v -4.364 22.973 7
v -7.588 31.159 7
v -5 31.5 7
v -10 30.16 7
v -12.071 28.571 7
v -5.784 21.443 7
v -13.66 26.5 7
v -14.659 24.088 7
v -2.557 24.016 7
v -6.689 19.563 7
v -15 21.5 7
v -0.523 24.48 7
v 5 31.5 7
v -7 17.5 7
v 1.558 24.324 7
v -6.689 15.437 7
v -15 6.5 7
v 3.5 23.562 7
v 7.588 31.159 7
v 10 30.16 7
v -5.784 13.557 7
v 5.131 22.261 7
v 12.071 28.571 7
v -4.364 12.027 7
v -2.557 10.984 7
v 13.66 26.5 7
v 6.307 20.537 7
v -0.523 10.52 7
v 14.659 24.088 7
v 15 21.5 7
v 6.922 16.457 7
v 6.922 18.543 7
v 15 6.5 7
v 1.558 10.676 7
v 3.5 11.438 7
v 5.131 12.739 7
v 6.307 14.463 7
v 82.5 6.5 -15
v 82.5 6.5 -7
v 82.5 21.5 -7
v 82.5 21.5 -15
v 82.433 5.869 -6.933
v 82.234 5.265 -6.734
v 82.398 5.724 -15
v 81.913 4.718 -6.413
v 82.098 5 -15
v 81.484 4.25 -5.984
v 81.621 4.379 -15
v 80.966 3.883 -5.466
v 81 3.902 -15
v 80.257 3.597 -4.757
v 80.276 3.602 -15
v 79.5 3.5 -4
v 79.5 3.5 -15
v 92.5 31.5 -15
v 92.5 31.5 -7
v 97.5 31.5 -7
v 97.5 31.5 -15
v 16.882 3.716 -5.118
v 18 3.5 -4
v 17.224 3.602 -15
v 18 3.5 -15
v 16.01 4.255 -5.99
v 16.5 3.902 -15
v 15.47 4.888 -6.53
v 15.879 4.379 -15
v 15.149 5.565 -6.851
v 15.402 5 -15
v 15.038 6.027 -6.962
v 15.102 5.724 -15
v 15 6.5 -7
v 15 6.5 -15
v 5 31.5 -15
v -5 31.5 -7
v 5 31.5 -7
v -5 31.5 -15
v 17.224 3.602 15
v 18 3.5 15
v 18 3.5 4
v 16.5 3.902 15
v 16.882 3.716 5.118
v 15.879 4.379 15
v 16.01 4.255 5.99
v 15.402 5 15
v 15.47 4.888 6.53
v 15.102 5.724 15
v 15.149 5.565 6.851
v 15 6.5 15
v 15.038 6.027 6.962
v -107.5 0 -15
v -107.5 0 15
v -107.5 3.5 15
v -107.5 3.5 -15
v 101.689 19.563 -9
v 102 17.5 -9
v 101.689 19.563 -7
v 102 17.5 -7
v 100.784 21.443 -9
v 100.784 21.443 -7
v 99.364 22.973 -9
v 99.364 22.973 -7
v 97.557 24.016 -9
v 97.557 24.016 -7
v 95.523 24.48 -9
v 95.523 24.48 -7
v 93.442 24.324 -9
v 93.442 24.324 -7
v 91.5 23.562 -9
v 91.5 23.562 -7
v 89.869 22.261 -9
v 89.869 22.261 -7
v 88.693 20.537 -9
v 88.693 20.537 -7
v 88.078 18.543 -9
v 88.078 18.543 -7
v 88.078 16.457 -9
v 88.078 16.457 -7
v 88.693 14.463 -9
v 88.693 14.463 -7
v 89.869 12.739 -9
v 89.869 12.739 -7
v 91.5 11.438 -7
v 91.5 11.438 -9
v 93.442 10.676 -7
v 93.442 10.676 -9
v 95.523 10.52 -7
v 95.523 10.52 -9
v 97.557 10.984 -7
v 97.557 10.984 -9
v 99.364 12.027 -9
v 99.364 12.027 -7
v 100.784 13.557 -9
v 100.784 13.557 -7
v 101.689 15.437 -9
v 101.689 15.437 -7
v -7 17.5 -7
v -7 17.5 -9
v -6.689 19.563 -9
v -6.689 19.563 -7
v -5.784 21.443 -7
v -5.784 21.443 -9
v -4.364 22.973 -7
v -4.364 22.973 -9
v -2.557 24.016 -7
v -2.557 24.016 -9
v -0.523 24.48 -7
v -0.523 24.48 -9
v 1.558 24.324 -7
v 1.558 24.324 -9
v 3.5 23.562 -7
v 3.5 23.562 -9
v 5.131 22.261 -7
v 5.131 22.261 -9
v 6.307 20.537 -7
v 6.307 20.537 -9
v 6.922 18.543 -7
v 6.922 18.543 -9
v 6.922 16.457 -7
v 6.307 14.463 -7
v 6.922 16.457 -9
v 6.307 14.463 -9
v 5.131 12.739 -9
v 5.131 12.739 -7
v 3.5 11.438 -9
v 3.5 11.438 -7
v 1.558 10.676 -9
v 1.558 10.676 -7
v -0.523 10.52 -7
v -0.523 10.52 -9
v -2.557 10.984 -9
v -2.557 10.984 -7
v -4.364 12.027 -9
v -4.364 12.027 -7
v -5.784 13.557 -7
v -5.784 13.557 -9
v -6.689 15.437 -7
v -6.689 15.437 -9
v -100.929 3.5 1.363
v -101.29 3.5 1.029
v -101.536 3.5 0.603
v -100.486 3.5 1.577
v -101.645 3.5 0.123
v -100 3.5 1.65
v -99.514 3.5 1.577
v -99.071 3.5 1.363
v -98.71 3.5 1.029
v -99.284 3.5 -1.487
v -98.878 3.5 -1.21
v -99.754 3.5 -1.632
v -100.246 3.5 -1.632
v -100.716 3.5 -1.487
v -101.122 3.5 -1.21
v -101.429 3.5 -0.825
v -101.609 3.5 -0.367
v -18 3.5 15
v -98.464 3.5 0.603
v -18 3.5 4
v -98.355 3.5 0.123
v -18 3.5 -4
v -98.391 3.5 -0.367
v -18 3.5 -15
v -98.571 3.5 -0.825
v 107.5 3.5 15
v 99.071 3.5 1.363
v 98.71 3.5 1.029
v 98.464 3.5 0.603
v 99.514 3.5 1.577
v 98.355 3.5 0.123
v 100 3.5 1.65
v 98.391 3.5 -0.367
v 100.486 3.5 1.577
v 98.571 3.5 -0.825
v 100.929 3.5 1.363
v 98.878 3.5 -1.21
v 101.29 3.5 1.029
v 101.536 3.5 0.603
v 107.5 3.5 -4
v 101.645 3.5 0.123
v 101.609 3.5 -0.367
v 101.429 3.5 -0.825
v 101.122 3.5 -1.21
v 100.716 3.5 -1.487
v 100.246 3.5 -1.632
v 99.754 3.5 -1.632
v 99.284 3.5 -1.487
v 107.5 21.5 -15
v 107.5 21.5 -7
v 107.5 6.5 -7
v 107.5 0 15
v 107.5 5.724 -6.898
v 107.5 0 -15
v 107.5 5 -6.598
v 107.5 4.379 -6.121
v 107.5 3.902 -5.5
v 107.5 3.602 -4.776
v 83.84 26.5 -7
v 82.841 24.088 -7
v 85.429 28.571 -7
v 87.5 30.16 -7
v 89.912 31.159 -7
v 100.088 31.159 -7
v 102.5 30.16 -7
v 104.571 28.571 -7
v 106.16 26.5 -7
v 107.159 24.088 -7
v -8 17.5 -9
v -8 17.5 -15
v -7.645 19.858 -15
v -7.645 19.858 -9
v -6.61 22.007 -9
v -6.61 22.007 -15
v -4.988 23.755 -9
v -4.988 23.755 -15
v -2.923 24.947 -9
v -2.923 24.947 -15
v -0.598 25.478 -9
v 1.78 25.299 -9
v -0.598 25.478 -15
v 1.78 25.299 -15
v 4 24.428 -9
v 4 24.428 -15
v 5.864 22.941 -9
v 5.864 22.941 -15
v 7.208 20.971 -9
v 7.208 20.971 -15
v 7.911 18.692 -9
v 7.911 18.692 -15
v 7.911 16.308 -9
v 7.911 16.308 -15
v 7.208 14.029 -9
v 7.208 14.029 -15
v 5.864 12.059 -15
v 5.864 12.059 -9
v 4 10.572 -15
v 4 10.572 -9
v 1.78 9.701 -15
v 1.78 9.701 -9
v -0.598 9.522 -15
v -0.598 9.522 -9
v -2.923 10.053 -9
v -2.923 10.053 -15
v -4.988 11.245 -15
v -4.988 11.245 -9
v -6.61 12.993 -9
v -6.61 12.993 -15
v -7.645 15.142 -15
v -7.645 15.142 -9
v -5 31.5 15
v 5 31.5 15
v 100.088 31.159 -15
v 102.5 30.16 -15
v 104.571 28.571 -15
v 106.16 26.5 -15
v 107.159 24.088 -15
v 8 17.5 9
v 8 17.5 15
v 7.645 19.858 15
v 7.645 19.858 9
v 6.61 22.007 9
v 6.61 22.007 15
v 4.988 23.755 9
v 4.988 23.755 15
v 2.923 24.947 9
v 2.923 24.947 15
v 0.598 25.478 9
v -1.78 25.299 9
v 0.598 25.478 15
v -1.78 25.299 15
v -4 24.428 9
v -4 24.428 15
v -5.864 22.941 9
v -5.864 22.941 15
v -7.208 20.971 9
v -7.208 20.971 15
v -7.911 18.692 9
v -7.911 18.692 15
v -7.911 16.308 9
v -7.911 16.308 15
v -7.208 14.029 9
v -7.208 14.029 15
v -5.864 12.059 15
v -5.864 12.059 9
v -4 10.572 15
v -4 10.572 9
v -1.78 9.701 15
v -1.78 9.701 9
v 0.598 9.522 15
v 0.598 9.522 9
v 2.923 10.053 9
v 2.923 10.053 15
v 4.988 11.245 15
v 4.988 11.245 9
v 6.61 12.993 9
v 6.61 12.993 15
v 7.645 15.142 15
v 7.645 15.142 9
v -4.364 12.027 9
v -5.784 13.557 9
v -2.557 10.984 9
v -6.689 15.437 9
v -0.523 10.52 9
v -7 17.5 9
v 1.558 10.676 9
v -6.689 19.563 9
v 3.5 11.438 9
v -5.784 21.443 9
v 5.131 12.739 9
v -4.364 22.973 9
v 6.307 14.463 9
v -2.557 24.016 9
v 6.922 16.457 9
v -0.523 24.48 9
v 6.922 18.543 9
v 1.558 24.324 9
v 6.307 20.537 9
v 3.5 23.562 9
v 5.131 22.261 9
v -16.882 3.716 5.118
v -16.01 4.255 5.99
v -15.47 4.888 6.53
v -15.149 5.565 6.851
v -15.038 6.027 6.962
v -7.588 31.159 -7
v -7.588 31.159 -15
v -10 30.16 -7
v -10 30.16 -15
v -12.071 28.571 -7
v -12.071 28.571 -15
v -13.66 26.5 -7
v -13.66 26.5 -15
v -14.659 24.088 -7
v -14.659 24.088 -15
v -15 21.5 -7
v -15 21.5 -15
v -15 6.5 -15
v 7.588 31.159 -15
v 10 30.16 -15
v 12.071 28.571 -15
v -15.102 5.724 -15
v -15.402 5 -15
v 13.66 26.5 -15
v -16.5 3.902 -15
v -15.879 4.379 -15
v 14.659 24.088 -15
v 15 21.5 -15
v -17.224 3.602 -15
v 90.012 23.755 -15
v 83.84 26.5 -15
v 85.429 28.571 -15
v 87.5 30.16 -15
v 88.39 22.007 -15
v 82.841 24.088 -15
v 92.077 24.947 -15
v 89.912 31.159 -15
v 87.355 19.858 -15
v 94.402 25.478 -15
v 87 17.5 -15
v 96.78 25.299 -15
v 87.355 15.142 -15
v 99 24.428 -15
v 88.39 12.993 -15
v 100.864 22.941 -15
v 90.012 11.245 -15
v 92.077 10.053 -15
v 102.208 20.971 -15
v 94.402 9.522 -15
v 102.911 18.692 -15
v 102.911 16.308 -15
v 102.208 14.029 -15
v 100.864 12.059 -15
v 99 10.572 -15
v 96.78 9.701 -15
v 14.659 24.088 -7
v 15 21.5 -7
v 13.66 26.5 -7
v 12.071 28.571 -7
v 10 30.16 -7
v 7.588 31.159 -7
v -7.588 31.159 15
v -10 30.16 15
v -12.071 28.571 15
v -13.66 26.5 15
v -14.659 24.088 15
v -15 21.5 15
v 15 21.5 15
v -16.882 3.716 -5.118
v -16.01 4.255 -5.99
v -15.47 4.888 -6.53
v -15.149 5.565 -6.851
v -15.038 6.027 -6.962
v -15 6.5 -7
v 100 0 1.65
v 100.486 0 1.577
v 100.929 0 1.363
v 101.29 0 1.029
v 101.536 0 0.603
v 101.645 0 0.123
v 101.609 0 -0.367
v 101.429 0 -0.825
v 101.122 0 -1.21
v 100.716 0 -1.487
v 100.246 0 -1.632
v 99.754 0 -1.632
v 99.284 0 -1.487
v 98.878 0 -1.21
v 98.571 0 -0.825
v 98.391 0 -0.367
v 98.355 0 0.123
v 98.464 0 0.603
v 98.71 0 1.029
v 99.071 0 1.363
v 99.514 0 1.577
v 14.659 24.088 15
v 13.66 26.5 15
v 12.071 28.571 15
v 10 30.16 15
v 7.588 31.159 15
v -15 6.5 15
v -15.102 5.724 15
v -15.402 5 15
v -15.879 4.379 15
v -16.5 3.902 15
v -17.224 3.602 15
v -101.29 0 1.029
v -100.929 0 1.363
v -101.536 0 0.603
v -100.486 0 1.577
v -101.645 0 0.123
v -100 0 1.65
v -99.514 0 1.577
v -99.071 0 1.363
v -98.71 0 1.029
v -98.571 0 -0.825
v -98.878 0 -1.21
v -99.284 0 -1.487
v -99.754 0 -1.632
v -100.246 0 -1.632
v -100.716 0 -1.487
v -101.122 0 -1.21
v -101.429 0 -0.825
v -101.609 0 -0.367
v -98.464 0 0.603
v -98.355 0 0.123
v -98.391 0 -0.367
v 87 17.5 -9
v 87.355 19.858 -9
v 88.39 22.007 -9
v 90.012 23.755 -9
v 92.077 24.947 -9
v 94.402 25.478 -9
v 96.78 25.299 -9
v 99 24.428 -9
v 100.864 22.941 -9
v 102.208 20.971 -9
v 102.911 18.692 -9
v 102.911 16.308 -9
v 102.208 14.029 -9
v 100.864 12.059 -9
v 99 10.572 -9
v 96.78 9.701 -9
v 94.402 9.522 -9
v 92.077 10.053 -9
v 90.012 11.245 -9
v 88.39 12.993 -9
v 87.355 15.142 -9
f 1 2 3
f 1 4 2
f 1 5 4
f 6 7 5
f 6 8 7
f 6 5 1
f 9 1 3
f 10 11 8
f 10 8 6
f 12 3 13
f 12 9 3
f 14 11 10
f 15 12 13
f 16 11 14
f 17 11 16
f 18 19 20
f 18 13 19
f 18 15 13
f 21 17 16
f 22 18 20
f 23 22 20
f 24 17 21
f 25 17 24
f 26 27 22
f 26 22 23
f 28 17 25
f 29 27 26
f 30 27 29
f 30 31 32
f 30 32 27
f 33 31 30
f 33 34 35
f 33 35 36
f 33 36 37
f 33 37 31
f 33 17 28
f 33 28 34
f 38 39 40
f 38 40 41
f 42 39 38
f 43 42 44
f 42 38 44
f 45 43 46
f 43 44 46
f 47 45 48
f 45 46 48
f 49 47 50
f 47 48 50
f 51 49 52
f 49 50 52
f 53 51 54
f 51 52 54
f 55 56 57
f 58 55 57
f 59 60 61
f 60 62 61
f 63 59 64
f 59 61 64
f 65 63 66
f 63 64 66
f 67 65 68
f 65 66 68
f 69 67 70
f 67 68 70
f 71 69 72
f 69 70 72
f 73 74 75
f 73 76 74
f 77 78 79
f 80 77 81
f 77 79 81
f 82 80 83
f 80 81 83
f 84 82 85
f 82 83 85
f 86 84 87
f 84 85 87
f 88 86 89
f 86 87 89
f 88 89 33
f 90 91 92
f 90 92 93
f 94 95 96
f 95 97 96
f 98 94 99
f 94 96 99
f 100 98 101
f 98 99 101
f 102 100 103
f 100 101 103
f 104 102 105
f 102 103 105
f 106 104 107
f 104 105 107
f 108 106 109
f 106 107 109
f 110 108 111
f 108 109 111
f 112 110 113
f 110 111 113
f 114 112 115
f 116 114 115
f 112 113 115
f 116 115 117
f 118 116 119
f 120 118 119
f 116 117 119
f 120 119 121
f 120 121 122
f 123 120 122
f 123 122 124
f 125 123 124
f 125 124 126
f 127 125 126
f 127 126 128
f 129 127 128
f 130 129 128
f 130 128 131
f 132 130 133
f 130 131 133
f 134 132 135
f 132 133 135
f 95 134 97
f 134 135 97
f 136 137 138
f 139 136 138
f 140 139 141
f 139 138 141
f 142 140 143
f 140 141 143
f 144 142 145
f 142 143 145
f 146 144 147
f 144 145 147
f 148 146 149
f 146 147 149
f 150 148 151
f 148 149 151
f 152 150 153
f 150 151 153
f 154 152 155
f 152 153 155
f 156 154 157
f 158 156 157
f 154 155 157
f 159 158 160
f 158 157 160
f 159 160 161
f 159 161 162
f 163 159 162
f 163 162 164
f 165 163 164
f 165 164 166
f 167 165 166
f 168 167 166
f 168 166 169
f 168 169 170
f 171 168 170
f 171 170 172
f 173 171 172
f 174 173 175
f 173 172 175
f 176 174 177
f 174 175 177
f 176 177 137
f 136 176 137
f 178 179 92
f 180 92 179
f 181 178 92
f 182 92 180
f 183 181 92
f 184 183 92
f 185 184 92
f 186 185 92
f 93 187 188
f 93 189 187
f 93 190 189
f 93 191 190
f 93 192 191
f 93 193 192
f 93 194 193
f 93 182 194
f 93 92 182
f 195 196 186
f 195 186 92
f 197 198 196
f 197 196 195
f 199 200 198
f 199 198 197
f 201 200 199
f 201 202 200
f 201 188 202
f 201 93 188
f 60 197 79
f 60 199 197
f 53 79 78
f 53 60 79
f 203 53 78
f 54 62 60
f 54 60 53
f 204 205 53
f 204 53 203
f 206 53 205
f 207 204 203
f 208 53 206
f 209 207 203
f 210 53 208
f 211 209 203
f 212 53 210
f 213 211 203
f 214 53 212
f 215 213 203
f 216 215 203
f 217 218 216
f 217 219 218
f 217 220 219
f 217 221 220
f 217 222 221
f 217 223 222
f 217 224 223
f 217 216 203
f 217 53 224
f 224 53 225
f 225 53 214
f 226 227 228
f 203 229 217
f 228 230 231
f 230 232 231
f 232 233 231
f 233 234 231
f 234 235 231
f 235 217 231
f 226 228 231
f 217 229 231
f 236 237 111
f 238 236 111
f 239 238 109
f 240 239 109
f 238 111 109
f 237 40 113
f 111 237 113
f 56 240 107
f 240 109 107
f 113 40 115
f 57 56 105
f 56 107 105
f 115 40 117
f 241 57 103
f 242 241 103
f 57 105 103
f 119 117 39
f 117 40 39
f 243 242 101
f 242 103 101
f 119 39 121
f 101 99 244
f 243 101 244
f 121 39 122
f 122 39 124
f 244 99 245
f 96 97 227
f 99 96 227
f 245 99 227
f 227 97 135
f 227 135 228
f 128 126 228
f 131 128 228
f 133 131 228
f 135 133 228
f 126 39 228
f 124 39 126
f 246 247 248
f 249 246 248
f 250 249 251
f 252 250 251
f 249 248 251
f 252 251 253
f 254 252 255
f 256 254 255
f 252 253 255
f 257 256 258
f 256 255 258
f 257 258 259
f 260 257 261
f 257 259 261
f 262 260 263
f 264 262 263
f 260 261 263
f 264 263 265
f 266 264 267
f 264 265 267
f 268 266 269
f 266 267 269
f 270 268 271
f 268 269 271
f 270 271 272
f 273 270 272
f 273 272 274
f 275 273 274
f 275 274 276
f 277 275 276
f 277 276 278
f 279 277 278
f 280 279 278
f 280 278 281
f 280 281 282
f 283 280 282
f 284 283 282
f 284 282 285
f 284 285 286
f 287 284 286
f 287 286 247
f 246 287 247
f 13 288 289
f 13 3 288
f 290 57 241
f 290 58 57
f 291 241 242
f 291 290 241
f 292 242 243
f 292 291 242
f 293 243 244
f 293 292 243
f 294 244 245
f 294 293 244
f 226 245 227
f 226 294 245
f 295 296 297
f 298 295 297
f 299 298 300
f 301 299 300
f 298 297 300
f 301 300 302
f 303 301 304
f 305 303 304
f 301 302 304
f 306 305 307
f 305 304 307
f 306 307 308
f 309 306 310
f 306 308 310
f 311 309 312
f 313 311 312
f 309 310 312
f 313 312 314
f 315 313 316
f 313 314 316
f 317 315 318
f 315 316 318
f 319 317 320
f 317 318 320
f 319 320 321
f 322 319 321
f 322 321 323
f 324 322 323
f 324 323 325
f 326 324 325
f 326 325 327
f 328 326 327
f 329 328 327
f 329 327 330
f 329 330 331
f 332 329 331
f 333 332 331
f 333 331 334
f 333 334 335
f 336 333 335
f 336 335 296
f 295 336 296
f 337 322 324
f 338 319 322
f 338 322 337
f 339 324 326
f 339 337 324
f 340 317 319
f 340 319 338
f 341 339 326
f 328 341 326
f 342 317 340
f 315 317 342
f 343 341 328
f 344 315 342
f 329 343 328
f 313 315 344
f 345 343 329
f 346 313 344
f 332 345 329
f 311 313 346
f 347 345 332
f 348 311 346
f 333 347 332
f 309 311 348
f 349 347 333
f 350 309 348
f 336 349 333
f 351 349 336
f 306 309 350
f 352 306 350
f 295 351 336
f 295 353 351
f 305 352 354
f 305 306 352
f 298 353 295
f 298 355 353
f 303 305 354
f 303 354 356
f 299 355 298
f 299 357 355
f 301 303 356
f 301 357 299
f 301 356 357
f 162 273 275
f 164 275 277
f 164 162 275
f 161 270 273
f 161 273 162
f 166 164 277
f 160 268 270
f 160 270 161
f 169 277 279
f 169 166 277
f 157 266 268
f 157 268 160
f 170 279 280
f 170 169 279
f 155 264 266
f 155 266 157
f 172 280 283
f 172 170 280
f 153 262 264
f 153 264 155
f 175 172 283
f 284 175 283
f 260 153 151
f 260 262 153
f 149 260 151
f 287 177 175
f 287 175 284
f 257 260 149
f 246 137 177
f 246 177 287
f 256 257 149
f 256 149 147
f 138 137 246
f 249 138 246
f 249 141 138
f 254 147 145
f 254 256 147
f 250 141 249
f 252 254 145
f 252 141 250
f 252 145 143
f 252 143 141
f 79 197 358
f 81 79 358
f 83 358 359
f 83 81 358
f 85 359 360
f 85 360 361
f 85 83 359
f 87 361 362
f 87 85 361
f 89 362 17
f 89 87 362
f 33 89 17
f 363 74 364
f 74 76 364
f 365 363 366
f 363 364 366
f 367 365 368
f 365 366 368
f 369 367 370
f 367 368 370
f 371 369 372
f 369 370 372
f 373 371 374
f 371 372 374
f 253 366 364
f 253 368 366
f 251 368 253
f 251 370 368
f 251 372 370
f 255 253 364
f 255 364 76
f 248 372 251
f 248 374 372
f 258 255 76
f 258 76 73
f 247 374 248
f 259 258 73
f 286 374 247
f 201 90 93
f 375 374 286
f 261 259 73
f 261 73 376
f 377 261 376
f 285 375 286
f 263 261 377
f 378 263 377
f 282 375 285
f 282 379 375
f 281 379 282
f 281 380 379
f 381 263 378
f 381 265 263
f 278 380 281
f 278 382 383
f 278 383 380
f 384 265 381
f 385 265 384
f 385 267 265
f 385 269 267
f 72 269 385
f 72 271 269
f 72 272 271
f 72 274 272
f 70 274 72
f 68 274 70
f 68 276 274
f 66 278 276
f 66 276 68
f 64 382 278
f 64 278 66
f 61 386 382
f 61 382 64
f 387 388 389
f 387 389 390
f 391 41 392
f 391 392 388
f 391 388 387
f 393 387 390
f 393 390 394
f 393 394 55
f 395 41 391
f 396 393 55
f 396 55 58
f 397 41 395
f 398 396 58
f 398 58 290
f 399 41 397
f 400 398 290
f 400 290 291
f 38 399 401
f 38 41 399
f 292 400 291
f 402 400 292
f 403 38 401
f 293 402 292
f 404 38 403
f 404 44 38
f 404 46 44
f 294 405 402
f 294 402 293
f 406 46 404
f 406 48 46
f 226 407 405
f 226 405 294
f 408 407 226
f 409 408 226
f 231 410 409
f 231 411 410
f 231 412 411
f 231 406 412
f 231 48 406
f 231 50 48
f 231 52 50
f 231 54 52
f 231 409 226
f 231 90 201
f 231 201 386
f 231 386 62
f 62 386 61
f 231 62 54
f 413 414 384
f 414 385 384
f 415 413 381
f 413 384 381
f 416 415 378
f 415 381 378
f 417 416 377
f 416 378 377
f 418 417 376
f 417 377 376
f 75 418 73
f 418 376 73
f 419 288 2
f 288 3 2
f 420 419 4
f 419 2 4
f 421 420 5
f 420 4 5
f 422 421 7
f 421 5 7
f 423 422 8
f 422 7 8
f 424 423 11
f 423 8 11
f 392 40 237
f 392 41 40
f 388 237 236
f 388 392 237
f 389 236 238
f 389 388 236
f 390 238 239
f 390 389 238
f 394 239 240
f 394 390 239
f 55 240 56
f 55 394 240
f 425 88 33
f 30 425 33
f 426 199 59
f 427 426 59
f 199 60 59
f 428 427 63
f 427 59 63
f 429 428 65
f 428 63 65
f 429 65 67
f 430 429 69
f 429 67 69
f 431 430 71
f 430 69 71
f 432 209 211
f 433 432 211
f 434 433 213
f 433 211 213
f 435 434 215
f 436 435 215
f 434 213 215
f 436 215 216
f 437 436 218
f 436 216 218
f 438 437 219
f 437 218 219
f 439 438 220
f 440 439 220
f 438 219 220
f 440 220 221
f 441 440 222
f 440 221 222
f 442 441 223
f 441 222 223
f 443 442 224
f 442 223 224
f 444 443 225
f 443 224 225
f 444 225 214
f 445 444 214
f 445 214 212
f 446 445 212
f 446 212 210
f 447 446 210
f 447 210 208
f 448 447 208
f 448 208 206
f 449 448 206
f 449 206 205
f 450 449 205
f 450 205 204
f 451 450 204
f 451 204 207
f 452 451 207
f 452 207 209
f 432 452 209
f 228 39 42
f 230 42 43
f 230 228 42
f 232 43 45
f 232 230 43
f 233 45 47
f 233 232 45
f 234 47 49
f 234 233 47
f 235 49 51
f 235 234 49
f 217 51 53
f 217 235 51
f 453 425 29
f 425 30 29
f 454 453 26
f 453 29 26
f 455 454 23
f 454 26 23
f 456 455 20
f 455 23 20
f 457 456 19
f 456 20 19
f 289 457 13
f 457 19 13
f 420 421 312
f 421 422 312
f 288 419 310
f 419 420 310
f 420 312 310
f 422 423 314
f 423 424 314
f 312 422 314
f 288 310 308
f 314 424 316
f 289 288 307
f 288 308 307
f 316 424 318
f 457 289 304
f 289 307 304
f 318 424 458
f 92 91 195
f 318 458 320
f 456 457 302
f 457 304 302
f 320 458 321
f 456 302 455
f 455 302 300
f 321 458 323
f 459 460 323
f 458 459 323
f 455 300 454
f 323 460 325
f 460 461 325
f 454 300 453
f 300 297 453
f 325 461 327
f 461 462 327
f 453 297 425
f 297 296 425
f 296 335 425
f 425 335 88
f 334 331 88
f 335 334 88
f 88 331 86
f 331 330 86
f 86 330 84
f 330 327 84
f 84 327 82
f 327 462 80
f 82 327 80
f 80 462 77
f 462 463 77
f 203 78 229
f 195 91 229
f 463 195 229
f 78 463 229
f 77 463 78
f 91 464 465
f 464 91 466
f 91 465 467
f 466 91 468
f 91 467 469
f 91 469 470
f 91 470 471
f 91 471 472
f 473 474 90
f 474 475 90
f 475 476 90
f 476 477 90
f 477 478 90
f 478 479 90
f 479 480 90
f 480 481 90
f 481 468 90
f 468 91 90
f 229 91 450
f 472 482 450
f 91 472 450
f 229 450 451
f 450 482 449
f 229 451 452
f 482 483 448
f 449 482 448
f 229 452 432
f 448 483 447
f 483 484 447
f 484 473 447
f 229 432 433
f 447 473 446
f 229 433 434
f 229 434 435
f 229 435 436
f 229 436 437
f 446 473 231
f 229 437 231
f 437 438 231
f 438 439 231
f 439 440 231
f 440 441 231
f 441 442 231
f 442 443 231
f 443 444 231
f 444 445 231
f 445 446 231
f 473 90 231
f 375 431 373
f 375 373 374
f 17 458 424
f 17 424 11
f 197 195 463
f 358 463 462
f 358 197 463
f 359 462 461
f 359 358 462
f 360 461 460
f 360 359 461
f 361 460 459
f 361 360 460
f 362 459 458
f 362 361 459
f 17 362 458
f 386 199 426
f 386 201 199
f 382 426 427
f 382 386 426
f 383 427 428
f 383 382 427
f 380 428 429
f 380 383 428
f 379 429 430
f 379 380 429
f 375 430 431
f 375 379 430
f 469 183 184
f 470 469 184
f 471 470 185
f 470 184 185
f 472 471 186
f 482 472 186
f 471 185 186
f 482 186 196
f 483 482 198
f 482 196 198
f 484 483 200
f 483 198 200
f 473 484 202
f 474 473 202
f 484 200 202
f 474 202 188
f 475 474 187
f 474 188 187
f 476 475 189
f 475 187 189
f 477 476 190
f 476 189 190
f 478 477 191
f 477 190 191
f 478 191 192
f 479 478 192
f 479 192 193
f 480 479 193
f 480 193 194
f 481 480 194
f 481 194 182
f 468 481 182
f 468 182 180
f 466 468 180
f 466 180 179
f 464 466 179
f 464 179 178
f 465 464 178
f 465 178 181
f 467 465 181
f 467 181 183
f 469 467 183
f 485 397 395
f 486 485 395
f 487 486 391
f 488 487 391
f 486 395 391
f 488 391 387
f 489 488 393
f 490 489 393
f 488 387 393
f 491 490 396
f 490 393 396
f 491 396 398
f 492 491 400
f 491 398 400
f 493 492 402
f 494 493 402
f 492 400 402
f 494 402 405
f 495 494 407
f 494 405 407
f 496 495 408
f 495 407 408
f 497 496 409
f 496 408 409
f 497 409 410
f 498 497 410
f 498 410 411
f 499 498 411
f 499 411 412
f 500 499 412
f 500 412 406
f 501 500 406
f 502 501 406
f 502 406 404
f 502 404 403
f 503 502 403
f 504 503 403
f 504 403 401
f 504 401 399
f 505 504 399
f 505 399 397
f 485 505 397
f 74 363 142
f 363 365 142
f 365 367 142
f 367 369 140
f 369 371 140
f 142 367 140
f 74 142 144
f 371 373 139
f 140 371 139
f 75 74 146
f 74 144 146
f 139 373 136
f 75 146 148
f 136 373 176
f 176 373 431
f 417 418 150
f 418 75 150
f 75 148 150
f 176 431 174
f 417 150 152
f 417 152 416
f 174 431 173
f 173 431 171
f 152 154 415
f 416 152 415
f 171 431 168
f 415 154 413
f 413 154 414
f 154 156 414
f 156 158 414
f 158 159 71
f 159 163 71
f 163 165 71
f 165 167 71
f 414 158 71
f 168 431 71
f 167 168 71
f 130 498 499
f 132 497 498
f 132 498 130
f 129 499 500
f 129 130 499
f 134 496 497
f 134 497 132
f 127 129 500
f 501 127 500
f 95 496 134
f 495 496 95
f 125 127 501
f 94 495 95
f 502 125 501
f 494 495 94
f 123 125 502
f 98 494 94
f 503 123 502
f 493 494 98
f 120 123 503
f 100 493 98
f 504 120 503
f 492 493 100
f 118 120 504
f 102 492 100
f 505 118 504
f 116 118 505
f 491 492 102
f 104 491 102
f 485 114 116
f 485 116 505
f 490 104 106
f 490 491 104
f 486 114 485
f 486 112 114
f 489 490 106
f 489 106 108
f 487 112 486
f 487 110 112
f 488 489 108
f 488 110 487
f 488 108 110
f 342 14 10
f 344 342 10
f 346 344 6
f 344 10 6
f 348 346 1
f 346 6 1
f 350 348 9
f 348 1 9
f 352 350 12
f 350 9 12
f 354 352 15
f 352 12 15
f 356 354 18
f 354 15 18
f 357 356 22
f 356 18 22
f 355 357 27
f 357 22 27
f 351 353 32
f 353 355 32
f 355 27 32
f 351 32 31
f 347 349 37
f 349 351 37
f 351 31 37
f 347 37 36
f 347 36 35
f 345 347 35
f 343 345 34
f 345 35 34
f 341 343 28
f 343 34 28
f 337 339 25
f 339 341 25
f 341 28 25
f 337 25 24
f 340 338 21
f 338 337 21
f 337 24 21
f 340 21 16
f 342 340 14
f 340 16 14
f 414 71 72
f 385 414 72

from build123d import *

# Parameters (mm, degrees)
SKETCH2_W                                         = 215
SKETCH2_H                                         = 30
BOSS_EXTRUDE1_DEPTH                               = 3.5
SKETCH4_W                                         = 30
SKETCH4_H                                         = 8
SKETCH4_W_2                                       = 25
BOSS_EXTRUDE2_DEPTH                               = 28
CBORE_FOR_M6_HEX_HEAD_BOLT1_D                     = 14
CBORE_FOR_M6_HEX_HEAD_BOLT1_CBORE_D               = 16
CBORE_FOR_M6_HEX_HEAD_BOLT1_CBORE_DEPTH           = 6
CBORE_FOR_M6_HEX_HEAD_BOLT1_ON_FACE_2_D           = 14
CBORE_FOR_M6_HEX_HEAD_BOLT1_ON_FACE_2_CBORE_D     = 16
CBORE_FOR_M6_HEX_HEAD_BOLT1_ON_FACE_2_CBORE_DEPTH = 6
FILLET1_R                                         = 10
HOLES_TBD_R                                       = 1.65
CUT_EXTRUDE1_DEPTH                                = 113.094825929
FILLET2_R                                         = 3


with BuildPart() as part:
    # Sketch2 → Boss-Extrude1 (new body)
    with BuildSketch(Plane(origin=(0, 0, 0), x_dir=(1, 0, 0), z_dir=(0, 1, 0))):
        Rectangle(SKETCH2_W, SKETCH2_H)
    extrude(amount=BOSS_EXTRUDE1_DEPTH)

    # Sketch4 → Boss-Extrude2 (add)
    with BuildSketch(Plane(origin=(0, 3.5, 0), x_dir=(1, 0, 0), z_dir=(0, 1, 0))):
        with Locations((0, -11)):
            Rectangle(SKETCH4_W, SKETCH4_H)
        with Locations((95, 11)):
            Rectangle(SKETCH4_W_2, SKETCH4_H)
        with Locations((0, 11)):
            Rectangle(SKETCH4_W, SKETCH4_H)
    extrude(amount=BOSS_EXTRUDE2_DEPTH)

    # CBORE for M6 Hex Head Bolt1 (through all)
    with Locations(Plane(origin=(0, 17.5, 15), x_dir=(1, 0, 0), z_dir=(0, 0, 1))):
        with Locations((0, 0)):
            CounterBoreHole(CBORE_FOR_M6_HEX_HEAD_BOLT1_D / 2, CBORE_FOR_M6_HEX_HEAD_BOLT1_CBORE_D / 2, CBORE_FOR_M6_HEX_HEAD_BOLT1_CBORE_DEPTH)

    # CBORE for M6 Hex Head Bolt1 on face 2 (through all)
    with Locations(Plane(origin=(0, 17.5, -15), x_dir=(-1, 0, 0), z_dir=(0, 0, -1))):
        with Locations((0, 0), (-95, 0)):
            CounterBoreHole(CBORE_FOR_M6_HEX_HEAD_BOLT1_ON_FACE_2_D / 2, CBORE_FOR_M6_HEX_HEAD_BOLT1_ON_FACE_2_CBORE_D / 2, CBORE_FOR_M6_HEX_HEAD_BOLT1_ON_FACE_2_CBORE_DEPTH)

    # Fillet1
    fillet1_edges = [part.edges().sort_by_distance(p)[0] for p in [
        (107.5, 31.5, -11),
        (82.5, 31.5, -11),
        (-15, 31.5, 11),
        (15, 31.5, 11),
        (-15, 31.5, -11),
        (15, 31.5, -11),
    ]]
    fillet(fillet1_edges, radius=FILLET1_R)

    # HOLES TBD → Cut-Extrude1 (cut, through all)
    with BuildSketch(Plane(origin=(0, 3.5, 0), x_dir=(1, 0, 0), z_dir=(0, 1, 0))):
        with Locations(Location((-100, 0, 0), (0, 0, 270))):
            Circle(HOLES_TBD_R)
        with Locations(Location((100, 0, 0), (0, 0, 270))):
            Circle(HOLES_TBD_R)
    extrude(amount=-CUT_EXTRUDE1_DEPTH, mode=Mode.SUBTRACT)

    # Fillet2
    fillet2_edges = [part.edges().sort_by_distance(p)[0] for p in [
        (82.5, 3.5, -11),
        (95, 3.5, -7),
        (-15, 3.5, 11),
        (15, 3.5, 11),
        (0, 3.5, 7),
        (-15, 3.5, -11),
        (0, 3.5, -7),
        (15, 3.5, -11),
    ]]
    fillet(fillet2_edges, radius=FILLET2_R)


solid = part.part
